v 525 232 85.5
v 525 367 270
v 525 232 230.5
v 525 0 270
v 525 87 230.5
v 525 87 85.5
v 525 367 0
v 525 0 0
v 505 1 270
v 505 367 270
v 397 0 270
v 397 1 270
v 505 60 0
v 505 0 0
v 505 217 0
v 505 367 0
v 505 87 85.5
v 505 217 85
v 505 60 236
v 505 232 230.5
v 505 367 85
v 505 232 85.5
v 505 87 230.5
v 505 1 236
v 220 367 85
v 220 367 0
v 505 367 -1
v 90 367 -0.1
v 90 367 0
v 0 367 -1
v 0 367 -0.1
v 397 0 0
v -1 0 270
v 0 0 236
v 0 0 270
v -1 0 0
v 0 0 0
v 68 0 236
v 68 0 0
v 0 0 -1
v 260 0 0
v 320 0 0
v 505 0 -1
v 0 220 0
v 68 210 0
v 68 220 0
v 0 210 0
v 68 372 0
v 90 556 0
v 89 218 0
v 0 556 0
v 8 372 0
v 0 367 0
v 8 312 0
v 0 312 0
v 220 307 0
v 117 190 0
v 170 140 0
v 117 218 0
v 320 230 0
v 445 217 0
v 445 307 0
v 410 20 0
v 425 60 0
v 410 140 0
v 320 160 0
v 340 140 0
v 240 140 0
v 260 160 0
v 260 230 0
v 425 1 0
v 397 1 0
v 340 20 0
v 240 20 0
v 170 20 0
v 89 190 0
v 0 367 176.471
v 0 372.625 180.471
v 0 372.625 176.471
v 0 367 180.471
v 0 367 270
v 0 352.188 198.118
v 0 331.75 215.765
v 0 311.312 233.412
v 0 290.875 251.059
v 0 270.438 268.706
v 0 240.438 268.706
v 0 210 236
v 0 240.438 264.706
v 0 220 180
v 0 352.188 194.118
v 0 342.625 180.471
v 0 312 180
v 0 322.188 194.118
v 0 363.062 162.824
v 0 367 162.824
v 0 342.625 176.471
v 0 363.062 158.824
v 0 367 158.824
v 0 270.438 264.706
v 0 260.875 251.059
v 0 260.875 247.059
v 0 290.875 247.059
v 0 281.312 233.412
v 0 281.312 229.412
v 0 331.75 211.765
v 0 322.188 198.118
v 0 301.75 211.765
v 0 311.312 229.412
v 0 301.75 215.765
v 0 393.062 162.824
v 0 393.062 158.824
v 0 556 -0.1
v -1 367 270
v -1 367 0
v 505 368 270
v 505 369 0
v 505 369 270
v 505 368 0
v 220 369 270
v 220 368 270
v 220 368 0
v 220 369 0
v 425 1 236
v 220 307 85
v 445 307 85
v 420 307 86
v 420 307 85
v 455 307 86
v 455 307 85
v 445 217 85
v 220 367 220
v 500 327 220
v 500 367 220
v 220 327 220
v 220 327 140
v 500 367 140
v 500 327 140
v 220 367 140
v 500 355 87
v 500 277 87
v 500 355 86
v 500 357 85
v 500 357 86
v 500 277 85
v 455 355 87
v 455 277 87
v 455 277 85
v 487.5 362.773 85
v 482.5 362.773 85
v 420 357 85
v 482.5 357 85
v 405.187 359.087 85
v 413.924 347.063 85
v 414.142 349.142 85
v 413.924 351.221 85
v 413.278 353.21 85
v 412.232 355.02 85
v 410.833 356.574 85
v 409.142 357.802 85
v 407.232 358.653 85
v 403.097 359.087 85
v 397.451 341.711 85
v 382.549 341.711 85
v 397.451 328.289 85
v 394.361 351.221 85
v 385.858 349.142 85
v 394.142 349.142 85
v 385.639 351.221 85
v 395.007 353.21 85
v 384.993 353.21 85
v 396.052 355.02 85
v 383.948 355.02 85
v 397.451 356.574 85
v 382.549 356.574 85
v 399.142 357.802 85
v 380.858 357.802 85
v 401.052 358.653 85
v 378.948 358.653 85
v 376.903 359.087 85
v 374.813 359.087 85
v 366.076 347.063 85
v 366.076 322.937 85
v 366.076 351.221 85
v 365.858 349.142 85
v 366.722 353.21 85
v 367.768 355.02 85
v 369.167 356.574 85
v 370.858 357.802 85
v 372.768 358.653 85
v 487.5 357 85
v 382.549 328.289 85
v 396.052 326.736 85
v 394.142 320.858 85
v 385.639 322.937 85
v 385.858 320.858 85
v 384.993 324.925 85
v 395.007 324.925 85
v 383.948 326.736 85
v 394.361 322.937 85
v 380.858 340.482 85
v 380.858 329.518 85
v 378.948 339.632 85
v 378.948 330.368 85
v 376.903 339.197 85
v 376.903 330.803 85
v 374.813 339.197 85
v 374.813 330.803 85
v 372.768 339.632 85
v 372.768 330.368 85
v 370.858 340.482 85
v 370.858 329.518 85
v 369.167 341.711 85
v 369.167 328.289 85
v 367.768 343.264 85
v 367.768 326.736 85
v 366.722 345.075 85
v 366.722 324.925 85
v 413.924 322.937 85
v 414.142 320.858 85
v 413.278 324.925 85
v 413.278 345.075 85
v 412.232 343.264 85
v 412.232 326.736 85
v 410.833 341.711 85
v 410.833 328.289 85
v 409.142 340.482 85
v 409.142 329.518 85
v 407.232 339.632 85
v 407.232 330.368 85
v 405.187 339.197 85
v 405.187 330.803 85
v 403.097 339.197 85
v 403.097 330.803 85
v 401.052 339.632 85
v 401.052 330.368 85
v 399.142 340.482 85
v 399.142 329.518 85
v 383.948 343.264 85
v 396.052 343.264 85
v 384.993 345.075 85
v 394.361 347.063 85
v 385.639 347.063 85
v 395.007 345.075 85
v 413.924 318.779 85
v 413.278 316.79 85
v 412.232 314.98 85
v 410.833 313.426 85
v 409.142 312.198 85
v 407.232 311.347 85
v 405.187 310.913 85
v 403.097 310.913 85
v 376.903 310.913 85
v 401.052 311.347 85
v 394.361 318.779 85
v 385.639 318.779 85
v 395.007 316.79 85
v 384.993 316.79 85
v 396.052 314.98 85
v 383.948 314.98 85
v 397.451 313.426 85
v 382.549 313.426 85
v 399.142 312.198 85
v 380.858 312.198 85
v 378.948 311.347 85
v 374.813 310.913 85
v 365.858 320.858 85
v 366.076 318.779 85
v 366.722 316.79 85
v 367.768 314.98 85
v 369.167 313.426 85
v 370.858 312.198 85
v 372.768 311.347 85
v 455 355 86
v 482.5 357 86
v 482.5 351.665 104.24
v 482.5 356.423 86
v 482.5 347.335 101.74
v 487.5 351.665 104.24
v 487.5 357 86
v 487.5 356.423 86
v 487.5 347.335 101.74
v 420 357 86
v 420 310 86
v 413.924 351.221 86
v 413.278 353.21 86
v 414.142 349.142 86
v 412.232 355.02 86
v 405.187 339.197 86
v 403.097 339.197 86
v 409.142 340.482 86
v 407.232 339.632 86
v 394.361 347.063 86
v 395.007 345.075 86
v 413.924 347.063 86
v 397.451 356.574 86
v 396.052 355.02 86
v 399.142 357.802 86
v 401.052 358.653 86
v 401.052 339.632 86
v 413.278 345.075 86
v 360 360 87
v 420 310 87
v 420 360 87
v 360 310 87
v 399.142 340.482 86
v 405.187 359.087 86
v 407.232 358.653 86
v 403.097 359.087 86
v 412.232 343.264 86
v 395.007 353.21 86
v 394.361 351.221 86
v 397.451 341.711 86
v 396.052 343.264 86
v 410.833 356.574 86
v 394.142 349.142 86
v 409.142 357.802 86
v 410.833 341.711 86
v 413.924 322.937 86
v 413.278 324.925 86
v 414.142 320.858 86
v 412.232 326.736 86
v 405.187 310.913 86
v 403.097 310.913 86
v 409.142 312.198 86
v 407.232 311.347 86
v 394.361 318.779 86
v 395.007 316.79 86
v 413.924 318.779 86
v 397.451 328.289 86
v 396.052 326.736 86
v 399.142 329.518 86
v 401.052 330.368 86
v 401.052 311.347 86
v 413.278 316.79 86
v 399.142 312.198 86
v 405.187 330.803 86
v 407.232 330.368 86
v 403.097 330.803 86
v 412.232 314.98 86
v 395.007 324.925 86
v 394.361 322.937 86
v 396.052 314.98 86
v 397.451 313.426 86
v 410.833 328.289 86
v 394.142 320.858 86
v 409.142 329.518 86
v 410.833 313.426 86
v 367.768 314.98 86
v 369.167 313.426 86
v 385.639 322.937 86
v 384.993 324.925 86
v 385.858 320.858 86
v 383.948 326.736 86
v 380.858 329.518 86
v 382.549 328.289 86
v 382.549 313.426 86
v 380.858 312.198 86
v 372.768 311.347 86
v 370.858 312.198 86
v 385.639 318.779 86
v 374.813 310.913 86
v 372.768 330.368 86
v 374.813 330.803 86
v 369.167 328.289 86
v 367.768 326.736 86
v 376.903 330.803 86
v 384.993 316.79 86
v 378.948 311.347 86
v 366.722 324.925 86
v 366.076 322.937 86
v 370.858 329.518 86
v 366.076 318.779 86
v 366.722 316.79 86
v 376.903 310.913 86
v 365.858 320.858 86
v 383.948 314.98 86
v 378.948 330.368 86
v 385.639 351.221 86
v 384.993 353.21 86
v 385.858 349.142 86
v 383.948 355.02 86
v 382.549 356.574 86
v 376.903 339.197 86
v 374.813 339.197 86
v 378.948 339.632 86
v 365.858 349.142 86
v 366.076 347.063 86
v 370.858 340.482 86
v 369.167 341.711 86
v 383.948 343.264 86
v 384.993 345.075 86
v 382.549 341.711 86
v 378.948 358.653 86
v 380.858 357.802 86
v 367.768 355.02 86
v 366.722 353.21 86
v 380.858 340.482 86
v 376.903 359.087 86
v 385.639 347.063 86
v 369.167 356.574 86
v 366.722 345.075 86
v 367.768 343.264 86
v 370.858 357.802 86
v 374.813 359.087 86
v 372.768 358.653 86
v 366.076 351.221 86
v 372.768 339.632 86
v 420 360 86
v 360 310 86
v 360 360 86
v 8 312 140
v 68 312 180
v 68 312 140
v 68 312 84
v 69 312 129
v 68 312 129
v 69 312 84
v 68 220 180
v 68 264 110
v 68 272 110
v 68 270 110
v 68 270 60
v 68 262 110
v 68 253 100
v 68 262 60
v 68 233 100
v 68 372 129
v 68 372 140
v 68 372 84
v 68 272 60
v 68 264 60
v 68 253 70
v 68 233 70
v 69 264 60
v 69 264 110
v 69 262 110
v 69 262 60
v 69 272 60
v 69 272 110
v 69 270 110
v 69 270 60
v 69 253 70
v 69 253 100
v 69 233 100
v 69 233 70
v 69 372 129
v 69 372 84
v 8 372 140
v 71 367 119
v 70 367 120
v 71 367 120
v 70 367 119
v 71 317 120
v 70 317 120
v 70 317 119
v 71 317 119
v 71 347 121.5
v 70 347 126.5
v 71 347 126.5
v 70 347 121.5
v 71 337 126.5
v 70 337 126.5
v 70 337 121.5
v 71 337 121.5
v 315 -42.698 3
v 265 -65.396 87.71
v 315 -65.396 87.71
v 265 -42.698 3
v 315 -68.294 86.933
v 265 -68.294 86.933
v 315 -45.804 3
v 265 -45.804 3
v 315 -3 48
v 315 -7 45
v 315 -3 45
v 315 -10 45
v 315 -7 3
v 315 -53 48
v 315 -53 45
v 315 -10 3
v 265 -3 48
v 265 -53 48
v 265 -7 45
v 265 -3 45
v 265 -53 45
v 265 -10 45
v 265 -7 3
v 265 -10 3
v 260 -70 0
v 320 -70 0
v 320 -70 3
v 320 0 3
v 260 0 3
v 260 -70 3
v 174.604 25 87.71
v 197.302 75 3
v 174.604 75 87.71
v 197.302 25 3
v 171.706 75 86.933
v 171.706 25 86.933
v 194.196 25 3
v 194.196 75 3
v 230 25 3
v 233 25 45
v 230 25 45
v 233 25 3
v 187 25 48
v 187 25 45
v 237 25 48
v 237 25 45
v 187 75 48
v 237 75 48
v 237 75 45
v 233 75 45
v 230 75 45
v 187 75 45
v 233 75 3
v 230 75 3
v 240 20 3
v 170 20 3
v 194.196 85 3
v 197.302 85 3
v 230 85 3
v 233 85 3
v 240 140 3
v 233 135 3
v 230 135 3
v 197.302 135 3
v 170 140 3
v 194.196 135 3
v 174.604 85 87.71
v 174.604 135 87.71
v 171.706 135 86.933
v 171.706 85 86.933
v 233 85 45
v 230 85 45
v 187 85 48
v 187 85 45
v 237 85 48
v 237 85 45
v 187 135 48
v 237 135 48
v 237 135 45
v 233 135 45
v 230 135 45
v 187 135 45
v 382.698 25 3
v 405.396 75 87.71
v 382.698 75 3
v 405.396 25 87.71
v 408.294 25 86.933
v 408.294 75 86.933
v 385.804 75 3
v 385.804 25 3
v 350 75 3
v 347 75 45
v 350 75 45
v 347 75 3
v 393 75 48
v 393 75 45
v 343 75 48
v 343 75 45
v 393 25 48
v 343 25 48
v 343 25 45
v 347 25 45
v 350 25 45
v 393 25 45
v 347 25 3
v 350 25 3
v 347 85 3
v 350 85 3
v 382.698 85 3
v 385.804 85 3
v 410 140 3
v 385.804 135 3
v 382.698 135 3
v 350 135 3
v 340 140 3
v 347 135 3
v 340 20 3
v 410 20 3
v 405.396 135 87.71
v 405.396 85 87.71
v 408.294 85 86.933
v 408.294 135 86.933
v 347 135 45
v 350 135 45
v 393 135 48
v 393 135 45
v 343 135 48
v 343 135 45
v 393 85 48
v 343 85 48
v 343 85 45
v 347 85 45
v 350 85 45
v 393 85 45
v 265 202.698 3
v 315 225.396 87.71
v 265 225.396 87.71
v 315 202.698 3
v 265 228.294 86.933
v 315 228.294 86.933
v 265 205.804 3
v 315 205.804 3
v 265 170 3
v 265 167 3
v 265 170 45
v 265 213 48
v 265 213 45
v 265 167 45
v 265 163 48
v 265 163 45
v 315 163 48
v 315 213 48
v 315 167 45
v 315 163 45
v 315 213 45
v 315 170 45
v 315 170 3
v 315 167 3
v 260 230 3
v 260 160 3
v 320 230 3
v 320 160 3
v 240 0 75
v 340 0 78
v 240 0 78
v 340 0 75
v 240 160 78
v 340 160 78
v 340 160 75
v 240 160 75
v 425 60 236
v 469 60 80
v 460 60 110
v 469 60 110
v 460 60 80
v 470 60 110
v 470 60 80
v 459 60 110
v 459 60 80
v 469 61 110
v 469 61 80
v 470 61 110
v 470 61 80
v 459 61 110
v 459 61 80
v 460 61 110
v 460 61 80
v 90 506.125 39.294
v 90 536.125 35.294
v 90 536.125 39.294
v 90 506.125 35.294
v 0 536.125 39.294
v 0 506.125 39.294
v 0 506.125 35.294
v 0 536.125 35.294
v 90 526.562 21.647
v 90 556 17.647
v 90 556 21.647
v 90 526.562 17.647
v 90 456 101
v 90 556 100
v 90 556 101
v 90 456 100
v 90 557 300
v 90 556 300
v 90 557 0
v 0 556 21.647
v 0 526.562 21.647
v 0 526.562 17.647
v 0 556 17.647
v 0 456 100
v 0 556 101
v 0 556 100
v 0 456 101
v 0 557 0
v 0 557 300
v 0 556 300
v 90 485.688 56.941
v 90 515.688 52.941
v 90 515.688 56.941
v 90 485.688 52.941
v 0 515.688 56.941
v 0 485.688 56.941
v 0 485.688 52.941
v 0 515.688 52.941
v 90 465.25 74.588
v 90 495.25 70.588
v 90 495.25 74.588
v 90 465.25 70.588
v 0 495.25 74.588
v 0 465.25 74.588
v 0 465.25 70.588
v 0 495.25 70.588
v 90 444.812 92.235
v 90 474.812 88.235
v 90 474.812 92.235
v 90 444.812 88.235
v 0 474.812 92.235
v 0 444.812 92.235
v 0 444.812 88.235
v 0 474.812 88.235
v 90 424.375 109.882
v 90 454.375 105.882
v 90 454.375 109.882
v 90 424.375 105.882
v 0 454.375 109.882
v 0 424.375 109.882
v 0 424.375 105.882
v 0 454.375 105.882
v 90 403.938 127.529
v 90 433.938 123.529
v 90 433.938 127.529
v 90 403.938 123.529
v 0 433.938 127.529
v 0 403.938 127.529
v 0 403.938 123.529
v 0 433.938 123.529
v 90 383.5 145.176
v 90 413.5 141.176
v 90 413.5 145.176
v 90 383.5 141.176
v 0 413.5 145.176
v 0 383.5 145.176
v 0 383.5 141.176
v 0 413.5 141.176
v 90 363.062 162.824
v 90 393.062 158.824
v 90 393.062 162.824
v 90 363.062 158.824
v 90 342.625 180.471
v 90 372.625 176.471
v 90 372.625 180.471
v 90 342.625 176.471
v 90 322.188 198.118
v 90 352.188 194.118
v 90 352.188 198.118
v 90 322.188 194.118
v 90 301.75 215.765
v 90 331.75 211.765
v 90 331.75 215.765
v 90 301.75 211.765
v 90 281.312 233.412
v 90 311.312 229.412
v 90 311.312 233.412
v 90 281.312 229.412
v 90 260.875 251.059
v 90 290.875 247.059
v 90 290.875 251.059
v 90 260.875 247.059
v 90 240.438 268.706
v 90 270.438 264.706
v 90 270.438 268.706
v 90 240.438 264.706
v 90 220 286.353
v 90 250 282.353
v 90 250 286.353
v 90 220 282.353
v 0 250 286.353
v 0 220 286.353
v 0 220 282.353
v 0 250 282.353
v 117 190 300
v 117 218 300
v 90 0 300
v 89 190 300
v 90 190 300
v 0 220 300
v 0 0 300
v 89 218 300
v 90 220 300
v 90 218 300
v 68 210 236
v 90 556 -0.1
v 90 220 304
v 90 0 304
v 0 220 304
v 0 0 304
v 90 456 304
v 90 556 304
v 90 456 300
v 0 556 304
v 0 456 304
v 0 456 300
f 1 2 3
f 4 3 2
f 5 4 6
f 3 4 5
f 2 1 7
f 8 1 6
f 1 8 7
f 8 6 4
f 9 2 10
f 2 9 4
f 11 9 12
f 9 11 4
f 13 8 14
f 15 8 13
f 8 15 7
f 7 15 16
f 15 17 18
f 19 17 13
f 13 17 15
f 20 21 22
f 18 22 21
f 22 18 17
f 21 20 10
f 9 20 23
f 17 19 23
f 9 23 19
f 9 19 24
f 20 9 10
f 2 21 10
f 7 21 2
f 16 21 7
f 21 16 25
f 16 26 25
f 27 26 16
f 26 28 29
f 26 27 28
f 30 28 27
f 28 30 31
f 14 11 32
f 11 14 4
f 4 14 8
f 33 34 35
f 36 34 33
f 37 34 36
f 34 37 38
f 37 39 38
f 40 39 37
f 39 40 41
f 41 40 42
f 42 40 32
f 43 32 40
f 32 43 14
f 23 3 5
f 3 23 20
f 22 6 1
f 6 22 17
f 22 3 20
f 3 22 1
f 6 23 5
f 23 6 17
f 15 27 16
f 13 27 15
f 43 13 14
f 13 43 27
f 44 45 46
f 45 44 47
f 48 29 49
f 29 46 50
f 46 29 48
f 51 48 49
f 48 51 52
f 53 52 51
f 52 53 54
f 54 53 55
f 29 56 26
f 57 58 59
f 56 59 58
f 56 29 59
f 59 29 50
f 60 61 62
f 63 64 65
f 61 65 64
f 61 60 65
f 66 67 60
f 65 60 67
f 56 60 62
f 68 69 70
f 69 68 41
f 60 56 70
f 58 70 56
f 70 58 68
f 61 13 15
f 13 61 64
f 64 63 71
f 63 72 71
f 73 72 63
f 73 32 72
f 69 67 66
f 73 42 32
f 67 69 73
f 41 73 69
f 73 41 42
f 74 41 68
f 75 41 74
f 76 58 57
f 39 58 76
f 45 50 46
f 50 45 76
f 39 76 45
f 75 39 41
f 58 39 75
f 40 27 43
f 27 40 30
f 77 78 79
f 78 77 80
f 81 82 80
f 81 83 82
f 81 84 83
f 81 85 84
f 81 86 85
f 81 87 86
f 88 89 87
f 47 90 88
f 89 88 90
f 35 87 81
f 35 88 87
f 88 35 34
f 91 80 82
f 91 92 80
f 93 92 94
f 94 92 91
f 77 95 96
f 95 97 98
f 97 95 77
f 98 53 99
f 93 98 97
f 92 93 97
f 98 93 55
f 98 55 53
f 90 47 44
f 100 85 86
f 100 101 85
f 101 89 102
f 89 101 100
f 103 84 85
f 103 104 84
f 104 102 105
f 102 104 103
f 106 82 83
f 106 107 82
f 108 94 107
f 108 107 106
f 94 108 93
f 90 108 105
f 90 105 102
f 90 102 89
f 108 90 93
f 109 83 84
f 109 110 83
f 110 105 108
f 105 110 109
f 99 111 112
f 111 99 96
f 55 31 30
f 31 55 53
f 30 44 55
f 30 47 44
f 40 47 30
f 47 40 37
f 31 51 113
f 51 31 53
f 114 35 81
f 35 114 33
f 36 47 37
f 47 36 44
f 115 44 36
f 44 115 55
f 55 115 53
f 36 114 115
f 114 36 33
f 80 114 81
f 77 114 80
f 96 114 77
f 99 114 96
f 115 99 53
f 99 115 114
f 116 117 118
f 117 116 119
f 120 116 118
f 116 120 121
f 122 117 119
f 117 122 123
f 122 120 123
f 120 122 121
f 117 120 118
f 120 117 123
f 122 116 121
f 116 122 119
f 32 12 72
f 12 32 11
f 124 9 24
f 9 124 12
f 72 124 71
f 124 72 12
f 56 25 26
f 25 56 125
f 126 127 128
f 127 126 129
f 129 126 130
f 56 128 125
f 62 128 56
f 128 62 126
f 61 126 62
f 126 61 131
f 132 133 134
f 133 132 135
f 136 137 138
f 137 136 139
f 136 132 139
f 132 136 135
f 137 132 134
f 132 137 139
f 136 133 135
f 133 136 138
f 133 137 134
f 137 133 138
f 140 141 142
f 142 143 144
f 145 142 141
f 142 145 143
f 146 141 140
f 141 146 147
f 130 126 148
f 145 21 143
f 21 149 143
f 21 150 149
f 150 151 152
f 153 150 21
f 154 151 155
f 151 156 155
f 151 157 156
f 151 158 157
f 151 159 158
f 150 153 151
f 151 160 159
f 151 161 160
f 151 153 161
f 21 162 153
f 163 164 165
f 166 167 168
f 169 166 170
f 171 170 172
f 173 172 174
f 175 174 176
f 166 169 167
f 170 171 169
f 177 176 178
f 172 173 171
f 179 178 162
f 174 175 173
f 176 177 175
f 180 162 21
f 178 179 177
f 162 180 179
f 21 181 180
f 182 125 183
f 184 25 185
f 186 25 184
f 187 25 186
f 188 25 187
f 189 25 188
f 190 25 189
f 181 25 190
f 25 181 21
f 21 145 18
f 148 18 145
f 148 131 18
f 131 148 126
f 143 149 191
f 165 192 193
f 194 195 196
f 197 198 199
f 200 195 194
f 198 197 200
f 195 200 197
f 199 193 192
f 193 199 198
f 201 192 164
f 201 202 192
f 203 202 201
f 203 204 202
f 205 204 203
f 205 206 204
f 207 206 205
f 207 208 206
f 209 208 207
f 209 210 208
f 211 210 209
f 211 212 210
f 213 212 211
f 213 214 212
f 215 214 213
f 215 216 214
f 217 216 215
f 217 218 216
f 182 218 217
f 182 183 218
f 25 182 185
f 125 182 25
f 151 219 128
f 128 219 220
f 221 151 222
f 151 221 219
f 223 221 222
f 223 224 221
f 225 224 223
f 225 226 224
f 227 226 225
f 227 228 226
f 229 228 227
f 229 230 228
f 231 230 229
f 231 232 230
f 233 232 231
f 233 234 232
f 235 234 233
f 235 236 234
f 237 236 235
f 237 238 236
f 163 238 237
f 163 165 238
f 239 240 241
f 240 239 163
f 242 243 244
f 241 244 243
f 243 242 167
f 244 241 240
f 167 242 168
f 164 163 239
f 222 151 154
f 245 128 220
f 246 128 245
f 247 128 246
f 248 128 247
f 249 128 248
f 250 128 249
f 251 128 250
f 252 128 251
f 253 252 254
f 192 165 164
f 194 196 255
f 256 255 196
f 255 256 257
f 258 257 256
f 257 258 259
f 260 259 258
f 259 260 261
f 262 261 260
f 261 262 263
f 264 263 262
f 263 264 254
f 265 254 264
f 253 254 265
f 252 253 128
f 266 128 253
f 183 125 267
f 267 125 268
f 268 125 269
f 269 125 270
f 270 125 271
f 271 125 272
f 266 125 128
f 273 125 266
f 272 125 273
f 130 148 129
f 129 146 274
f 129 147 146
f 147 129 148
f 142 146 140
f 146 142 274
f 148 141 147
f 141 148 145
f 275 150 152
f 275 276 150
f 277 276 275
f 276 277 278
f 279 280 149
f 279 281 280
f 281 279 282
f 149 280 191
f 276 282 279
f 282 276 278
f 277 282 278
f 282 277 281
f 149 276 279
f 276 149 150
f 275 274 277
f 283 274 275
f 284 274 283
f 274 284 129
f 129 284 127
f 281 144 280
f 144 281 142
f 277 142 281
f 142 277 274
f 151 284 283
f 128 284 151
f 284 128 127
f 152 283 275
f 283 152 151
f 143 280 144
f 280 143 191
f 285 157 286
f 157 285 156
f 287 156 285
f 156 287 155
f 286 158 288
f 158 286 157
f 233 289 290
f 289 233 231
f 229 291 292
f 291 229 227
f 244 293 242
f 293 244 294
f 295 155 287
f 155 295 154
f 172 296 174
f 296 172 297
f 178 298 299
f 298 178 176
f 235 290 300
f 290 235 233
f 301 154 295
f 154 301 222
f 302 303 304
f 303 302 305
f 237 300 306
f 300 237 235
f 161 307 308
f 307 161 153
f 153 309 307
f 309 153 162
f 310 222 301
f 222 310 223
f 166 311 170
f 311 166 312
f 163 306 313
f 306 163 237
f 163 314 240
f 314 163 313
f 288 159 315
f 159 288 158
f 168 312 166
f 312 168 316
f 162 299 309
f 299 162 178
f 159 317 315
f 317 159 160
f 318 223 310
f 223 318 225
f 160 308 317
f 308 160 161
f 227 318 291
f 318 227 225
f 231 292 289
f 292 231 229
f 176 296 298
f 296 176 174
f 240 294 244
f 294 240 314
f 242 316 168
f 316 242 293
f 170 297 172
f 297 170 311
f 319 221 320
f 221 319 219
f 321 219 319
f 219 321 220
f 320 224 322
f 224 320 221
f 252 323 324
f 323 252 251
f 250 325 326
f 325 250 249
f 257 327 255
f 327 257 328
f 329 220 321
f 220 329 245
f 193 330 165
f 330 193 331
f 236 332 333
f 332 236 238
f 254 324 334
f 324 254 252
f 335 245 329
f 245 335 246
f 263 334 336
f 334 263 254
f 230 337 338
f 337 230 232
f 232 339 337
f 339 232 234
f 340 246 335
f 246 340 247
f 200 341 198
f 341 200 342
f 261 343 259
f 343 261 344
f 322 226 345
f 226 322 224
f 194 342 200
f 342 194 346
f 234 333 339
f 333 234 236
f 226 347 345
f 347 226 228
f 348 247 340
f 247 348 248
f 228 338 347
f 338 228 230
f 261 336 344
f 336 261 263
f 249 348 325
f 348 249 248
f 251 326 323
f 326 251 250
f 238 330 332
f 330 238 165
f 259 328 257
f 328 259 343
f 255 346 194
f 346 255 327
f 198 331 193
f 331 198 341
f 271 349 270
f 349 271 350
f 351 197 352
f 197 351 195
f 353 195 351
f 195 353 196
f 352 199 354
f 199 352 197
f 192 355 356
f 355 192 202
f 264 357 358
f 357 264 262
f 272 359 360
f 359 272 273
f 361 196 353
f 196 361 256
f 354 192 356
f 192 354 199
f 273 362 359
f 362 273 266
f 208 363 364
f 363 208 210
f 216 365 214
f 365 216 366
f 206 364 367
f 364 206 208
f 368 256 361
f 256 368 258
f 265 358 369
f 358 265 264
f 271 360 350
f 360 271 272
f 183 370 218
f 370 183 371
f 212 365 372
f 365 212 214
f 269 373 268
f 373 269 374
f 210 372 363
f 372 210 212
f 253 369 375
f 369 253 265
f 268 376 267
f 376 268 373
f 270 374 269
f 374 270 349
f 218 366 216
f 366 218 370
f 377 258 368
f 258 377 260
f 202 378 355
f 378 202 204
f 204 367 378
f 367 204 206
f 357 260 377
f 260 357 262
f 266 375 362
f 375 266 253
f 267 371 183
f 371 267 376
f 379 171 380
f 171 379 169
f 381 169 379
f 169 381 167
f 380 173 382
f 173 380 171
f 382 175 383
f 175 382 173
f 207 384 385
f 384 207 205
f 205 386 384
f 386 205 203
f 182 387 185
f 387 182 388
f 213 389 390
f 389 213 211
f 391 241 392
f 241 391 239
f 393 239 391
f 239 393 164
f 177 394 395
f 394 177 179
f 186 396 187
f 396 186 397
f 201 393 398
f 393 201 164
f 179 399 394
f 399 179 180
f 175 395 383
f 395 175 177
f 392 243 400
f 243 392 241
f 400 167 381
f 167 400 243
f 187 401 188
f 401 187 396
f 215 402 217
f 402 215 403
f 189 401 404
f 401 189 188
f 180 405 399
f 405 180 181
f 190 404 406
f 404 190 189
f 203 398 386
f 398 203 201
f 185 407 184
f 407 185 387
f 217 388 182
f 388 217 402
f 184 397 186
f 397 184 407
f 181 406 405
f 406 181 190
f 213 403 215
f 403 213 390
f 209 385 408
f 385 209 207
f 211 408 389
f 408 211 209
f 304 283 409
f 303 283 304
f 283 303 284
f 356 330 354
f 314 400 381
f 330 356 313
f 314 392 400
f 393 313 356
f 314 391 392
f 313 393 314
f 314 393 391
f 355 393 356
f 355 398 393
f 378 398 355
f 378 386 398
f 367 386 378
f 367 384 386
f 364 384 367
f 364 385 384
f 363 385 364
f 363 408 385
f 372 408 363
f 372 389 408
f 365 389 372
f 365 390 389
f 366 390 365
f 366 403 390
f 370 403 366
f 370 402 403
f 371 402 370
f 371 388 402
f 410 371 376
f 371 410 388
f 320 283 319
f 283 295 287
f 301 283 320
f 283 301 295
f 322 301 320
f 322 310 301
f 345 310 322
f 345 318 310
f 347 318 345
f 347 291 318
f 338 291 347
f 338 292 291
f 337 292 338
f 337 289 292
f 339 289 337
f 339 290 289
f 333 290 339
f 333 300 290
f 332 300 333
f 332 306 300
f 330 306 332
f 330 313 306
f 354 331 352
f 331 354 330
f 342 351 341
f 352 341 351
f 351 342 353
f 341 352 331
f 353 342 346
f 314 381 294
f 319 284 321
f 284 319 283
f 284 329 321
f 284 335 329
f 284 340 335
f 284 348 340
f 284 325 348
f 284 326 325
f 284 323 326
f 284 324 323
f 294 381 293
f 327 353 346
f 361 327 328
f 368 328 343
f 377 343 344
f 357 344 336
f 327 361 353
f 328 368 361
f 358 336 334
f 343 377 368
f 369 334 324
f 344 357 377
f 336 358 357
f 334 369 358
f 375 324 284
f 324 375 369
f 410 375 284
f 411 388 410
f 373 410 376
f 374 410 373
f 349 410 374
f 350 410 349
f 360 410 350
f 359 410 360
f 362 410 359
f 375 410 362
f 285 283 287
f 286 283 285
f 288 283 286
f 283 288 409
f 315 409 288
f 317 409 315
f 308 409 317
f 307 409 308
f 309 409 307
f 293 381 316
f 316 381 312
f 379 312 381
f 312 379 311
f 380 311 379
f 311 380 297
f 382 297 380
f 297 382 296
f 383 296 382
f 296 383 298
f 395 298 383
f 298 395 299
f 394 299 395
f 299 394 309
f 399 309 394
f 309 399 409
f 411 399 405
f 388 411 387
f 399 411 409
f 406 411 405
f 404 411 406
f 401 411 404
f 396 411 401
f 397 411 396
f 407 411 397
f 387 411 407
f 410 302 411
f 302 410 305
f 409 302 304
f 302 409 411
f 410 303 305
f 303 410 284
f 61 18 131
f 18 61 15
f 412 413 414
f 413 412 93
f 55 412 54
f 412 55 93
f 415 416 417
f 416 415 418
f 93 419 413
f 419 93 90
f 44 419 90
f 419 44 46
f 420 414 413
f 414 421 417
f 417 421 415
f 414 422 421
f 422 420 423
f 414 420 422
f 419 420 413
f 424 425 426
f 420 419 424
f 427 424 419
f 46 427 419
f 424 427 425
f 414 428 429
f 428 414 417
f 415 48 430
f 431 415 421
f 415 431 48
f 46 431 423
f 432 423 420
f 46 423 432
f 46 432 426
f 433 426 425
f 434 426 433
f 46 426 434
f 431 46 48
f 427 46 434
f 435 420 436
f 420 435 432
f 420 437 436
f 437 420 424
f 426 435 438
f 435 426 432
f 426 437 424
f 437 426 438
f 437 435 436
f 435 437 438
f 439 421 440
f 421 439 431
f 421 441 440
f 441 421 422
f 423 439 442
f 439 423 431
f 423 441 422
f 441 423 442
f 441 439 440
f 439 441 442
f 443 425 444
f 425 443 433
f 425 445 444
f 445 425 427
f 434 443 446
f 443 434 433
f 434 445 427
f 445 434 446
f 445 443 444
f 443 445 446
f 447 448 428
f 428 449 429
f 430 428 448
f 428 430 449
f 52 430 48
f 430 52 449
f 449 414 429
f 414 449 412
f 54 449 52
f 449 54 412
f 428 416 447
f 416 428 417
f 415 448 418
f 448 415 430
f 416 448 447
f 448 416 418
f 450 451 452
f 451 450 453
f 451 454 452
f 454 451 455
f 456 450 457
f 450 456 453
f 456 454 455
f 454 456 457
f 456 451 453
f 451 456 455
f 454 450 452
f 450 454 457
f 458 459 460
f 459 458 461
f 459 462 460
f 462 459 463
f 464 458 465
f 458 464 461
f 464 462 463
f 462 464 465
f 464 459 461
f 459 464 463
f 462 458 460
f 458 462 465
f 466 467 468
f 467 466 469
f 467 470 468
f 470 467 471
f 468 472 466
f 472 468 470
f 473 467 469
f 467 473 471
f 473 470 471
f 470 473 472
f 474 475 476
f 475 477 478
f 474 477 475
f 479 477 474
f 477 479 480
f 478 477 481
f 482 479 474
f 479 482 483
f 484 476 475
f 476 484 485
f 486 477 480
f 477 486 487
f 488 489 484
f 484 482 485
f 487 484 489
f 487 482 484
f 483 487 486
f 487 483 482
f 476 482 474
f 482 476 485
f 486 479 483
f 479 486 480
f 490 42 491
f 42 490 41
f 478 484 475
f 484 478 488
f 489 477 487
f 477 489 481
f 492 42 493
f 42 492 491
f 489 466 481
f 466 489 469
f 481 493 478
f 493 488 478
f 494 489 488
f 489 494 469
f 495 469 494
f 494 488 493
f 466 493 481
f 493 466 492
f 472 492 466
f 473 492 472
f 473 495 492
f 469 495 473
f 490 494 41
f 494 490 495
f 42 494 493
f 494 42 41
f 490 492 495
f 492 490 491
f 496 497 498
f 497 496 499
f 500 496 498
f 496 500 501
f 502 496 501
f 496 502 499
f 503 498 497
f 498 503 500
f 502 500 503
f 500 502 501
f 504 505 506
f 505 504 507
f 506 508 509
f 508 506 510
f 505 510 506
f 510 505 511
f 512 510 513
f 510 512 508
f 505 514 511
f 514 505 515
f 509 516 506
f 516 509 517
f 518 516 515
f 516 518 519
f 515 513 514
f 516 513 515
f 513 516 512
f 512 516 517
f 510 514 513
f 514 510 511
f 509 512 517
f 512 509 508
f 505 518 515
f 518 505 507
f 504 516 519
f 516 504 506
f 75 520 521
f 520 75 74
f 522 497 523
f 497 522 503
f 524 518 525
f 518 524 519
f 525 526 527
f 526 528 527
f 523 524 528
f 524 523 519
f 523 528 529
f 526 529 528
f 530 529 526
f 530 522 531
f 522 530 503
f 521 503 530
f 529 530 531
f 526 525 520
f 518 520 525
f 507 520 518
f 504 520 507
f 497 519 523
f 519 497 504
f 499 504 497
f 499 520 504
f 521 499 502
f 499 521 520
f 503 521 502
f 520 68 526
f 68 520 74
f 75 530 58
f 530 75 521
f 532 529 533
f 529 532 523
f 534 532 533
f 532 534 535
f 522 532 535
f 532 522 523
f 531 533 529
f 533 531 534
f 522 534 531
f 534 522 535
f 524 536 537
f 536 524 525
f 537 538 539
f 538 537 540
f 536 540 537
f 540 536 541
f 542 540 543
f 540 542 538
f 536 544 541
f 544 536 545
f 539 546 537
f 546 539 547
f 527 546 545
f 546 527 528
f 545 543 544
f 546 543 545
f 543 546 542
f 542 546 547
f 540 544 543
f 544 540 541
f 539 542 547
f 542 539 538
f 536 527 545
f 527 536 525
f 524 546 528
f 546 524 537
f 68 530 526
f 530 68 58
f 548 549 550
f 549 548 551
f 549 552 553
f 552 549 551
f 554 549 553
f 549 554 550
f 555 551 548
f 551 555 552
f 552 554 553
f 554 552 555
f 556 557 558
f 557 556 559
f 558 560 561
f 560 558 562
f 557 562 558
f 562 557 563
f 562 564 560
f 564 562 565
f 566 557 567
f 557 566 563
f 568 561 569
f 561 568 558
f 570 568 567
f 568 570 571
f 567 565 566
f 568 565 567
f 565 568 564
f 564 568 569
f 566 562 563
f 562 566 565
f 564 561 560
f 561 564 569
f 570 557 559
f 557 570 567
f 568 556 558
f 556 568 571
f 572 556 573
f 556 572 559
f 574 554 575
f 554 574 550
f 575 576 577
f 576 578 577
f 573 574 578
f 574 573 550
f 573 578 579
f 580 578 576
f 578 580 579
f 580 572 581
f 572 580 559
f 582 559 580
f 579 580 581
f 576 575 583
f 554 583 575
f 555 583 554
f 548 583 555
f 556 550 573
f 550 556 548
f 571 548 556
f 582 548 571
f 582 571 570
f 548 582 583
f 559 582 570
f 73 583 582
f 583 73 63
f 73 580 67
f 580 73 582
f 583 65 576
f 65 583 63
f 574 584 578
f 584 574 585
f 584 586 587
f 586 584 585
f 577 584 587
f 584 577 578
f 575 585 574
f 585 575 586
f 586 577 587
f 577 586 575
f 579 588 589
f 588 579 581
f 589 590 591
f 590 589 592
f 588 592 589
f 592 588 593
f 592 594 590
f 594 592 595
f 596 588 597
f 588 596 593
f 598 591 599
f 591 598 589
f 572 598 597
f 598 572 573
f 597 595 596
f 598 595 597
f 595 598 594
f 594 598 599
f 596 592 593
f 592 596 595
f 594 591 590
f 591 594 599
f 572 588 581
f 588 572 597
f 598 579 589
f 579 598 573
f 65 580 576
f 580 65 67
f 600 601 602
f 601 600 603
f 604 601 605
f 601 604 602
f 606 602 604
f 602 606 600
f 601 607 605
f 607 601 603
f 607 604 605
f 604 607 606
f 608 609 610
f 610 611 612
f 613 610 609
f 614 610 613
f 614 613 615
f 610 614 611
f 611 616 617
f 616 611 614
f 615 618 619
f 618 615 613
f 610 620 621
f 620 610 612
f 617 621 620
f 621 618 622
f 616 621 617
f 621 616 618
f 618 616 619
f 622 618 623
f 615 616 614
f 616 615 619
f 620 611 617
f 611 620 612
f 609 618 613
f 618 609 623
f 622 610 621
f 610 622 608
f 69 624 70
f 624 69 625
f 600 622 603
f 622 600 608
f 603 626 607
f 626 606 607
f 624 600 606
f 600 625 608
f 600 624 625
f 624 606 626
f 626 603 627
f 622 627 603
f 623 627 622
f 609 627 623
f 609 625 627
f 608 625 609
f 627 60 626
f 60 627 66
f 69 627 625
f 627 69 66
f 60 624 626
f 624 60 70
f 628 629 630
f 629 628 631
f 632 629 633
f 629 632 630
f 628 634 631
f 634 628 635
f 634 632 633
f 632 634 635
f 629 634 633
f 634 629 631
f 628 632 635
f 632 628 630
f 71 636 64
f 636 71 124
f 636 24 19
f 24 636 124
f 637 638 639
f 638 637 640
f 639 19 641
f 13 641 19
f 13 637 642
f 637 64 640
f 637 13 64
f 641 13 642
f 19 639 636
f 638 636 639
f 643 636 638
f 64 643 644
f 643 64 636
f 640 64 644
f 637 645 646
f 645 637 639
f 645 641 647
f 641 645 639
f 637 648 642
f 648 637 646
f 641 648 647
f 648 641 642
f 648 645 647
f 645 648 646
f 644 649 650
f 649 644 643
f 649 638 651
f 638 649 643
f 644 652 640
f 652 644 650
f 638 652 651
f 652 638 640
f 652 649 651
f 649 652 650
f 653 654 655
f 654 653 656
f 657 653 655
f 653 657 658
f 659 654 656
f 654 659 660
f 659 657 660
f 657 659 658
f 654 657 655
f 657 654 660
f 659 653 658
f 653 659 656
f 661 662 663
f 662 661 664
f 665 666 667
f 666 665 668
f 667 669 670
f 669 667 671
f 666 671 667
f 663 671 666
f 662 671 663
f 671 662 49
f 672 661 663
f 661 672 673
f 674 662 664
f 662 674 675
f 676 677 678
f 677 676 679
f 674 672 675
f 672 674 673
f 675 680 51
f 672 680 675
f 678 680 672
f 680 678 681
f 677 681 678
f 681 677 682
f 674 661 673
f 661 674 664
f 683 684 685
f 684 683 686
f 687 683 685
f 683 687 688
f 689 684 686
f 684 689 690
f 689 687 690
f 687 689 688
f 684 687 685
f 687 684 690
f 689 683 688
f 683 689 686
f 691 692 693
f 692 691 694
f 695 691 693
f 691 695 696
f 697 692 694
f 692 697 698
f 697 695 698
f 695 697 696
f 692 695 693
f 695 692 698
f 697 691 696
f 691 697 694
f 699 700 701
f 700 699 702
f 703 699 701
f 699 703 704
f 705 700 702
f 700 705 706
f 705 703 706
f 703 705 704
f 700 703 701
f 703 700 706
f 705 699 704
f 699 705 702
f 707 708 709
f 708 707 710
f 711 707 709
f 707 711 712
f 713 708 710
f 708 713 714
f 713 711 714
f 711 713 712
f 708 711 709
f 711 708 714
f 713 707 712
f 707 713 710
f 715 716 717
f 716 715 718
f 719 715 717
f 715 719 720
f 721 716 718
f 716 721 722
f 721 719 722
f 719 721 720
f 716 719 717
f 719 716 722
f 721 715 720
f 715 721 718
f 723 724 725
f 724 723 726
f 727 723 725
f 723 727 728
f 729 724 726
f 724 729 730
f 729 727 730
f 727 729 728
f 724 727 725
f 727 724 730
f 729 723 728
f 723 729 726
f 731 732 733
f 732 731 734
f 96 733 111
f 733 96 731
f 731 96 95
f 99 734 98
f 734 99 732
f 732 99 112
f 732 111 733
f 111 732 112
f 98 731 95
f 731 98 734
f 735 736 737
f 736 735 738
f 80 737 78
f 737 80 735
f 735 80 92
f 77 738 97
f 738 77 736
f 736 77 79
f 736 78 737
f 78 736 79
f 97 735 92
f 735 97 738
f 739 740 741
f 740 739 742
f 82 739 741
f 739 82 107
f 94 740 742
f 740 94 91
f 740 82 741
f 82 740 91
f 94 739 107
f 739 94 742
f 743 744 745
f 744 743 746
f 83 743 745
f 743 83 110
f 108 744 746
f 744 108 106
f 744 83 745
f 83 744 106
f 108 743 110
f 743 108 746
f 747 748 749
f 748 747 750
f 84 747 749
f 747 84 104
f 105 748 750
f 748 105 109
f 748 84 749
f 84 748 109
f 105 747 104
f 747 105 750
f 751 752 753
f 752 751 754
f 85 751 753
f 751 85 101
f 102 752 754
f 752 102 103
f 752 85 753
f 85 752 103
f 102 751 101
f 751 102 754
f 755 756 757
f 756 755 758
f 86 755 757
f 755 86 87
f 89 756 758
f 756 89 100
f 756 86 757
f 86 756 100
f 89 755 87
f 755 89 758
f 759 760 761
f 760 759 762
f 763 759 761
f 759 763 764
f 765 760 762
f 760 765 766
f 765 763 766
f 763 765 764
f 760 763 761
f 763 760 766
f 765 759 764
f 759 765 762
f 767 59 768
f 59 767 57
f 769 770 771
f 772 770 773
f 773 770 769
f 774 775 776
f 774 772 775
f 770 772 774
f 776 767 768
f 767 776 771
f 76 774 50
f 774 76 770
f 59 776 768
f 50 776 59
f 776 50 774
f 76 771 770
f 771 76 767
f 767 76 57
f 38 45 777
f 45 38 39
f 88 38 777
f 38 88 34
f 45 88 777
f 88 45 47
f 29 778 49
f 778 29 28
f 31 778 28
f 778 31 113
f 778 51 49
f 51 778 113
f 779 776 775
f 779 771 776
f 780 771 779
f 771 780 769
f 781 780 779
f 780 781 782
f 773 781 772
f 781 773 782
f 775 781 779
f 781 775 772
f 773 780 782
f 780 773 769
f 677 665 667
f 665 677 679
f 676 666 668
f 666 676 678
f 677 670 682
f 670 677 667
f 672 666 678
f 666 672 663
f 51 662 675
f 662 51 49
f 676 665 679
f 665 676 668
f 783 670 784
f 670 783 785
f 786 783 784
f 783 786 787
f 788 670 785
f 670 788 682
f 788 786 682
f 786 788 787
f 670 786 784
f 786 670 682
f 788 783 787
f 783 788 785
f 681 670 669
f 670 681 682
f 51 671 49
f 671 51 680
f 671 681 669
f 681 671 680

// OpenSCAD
// floor

h=270;
w=505;
d=367;

//sciany
color("white")
 {
  //podloga
  translate([0,0,-1])
    cube([w,d,1]);
  //lewa   
  translate([-1,0,0])
    cube([1,d,h]);
  // tylna
  translate([220,d+1,0])
    cube([285,1,h]);
  // prawa
  translate([w,0,0])
    difference() {
     cube([20,d,h]);
     translate([-1,87,85.5]) cube([30,145,145]); // okno
    };
  // parapet
  //translate([w-4,d-131,85])
  //  rotate(a=[0,0,-90])
  //    cube([151,4,1]);
  // tylna
  translate([w-108,0,0])
    cube([108,1,h]);
 }
 
 // kolumna
 color("white")
   translate([89,190,0])
     cube([28,28,300]);
 
 // L: ciag szafek na tylnej scianie
 k=100;
 s=120;  
 LX=k+s; // poczatek szafek z tylu
 LY=d-60;  // poczatek szafek z tylu
 SZ_X=w-LX;
 
 wys_blatu = 82;
 
 // blat tyl
 color("white")
   translate([LX,LY,wys_blatu])
     cube([SZ_X,60,3]);
 
 color("green") {
   szafka(LX,80);
   szafka(LX+80,60);
   szafka(LX+140,60);
   szafka(LX+200,25);
 }


// szafa po lewej 
color("green") {
    cube([68,190+20,236]);
}

// zlew
module zlew() {
color("DimGray") {
    translate([LX+140,LY+2,wys_blatu+4]) {
      cube([80,50,1]);
      translate([30,50,0]) rotate(a=[30,0,0]) cube([5,5,30],center=true);
    }
}
color("#404040") {
    translate([LX+143,LY+4,wys_blatu+4]) {
      cube([80-4-20,50-4,1.5]);
    }
  }
}
//zlew();

// zlew narozny
module zlew_narozny() {
      color("DimGray") { 
          cube([80,50,1]);
      }
      color("#404040") {
          translate([80-45,-(80-50),0]) rotate([0,0,00]) cube([45,78,2]);
          translate([65,50,5]) rotate(a=[30,0,0]) cube([5,5,30],center=true);
      }

}

 
module szafka(leftoffset,width) {
    translate([leftoffset,d-60,0])
      cube([width,60,82]);
}

// szafki gorne z tylu
color("green") {
    umiesc_z_przodu([0,20,140]) szafka_wiszaca(80);
    umiesc_z_przodu([80,20,140]) szafka_wiszaca(60);
    umiesc_z_przodu([80+60,20,140]) szafka_wiszaca(80);
    umiesc_z_przodu([80+60+80,20,140]) szafka_wiszaca(60);
}
    umiesc_z_przodu([80+60+60,00,85])  zlew_narozny(); 


module szafka_wiszaca(w) {
    cube([w,40,80]);
}

// umiesc
module umiesc_z_przodu(a) {
    translate([LX+a.x,LY+a.y,a.z]) 
      rotate(a=[0,0,0])
        children();
}

R_szerokosc=70;
RX=w-60;
RY=d-60;

// blat
module blat(w) {
color("white")
      cube([w,60,3]);
}

katy=[45,135,-135,-45];

// plyta indukcyjna
module plyta_indukcyjna() {
    cube([60,50,1]);
    for (i=[0:3]) {
    translate([30+sin(katy[i])*20,25+cos(katy[i])*20,0]) 
        cylinder(2,r1=10,r2=10,center=true);
    }
}

// plyta
color("#400040") umiesc_z_przodu([80+60,3,wys_blatu+4]) plyta_indukcyjna();


module blatowyspa() {
  dlugosc=280;
  szerokosc=100;
  translate([0,0,75]) translate([0,-dlugosc+60,0]) cube([szerokosc,dlugosc,1]);
}

// blatowyspa
make_blatowyspa = false;

if (make_blatowyspa) {
    color("#A0A0A0") umiesc_z_boku([60+60+10+60,0,0]) blatowyspa();
    translate([w-60,10,0]) krzeslo();
    translate([w-120,10,0]) krzeslo();
    translate([w-180,10,0]) krzeslo();
    translate([w-240,10,0]) krzeslo();
    translate([w-180,10+100+70+70,0]) rotate([0,0,180]) krzeslo();
    translate([w-120,10+100+70+70,0]) rotate([0,0,180]) krzeslo();
}

//---- bok
// blaty
umiesc_z_boku([60,0,wys_blatu]) blat(90);
// szafki
//umiesc_z_boku([0,0,wys_blatu+2]) zlew_narozny();
color("green") {
    umiesc_z_boku([0,0,0]) cube([90,60,82]);
    umiesc_z_boku([90,0,0]) cube([60,60,82]);
    //umiesc_z_boku([40,20,140]) szafka_wiszaca(80);
}


// umiesc
module umiesc_z_boku(a) {
    translate([RX+a.y,d-a.x,a.z]) 
      rotate(a=[0,0,-90])
        children();
}

// lewa strona
//color("white",alpha=0.1) translate([LX,LY-60,wys_blatu]) cube([60,100,3]);
//color("green", alpha=0.1) translate([LX,LY-60,0]) cube([60,100,wys_blatu]);

// slupek z piekarnikiem

// lodowka
translate([68,220,0]) rotate([0,0,90]) lodowka();

// piekarnik
translate([68,220+92,0]) rotate([0,0,90]) piekarnik();


// lodowka
module lodowka() {
  szer=92;
  gl=68;
  color("silver") cube([szer,gl,180]);
  color("#808080") translate([szer/2-4,-1,60]) cube([2,1,50]);
  color("#808080") translate([szer/2+4,-1,60]) cube([2,1,50]);
  color("#808080") translate([szer/4-10,-1,70]) cube([20,1,30]);
}

// piekarnik
module piekarnik() {
    color("green") cube([60,60,140]);
    h0=84;
    translate([0,-1,h0]) color("black") cube([60,1,45]);
    translate([5,-3,h0+35]) color("white") cube([50,1,1]);
    translate([60/2-5,-3,h0+37.5]) color("blue") cube([10,1,5]);
}


/*
// blat stolu
translate([w-70-260,70,75]) color("brown", alpha=0.5) cube([260,100,3]);

translate([w,60+30,0]) rotate(a=[0,0,90]) krzeslo(); // szczyt
translate([w-70-60,0,0]) rotate(a=[0,0,0]) krzeslo();
translate([w-70-60-60,0,0]) rotate(a=[0,0,0]) krzeslo();
translate([w-70-60-60-60,0,0]) rotate(a=[0,0,0]) krzeslo();
translate([w-70-60-60-60-60,0,0]) rotate(a=[0,0,0]) krzeslo();
translate([w-70,70+100+70,0]) rotate(a=[0,0,180]) krzeslo();
translate([w-70-60,70+100+70,0]) rotate(a=[0,0,180]) krzeslo();
translate([w-70-60-60,70+100+70,0]) rotate(a=[0,0,180]) krzeslo();
translate([w-70-60-60-60,70+100+70,0]) rotate(a=[0,0,180]) krzeslo();
translate([w-70-60-60-60-60-90,100+70-20,0]) rotate(a=[0,0,-90]) krzeslo();
*/

// krzeslo
module krzeslo() {
    translate([5,25,0]) {
    color("brown") rotate(a=[15,0,0]) cube([50,3,90]);
    color("brown") translate([0,-8,45]) cube([50,50,3]);
    color("brown") translate([0,35,0]) cube([50,3,45]);
    }
    color("#101010") cube([60,70,3]);
}


module maly_stol() { 
  // blat malego stolu
  translate([-160-70,70,75]) color("brown", alpha=0.5) cube([160,100,3]);
  // krzesla malego stollu
  translate([0,60+30,0]) rotate(a=[0,0,90]) krzeslo(); // szczyt
  translate([-70-60-20,0,0]) rotate(a=[0,0,0]) krzeslo();
  translate([-70-60-60-20,0,0]) rotate(a=[0,0,0]) krzeslo();
  translate([-70-20,70+100+70,0]) rotate(a=[0,0,180]) krzeslo();
  translate([-70-60-20,70+100+70,0]) rotate(a=[0,0,180]) krzeslo();
  translate([-10-70-60-60-100,100+70-20,0]) rotate(a=[0,0,-90]) krzeslo(); // dol
}

make_malystol = true;
if (make_malystol) {
translate([120+50,-70,0]) rotate(a=[0,0,-90])  maly_stol();
//translate([450,0,0]) rotate(a=[0,0,0])  maly_stol();
}

// szafa tyl
module szafa_tyl() {
    sz=80;
    color("green") cube([sz,60,236]);
    color("grey") translate([sz/2-5,-1,80]) cube([1,1,30]);
    color("grey") translate([sz/2+5,-1,80]) cube([1,1,30]);
}

translate([w,60,0]) rotate([0,0,180]) szafa_tyl();


module przyklej(w) { translate([w.x,w.y,w.z]) children(); }


// kalkulacje schody
htotal = 300;
num = 17;
h1 = 300/(num);
space = 336;
step_depth = 30;
//step_dist_tmp = space/(num-1);
//step_dist = step_dist_tmp - (step_depth - step_dist_tmp)/(num-1);

// shorter step_dist to accomodate for steps longer than 
// the inter-step distance
step_dist = (-step_depth*num + num*space + step_depth)/(num-1)/(num-1);

module schodek() { 
    color("#705030") cube([90,step_depth,4]);
}


module schody(n) {
    h=h1;
    przyklej([0,0,-h]) schodek();
    if(n>1) {
      przyklej([0,step_dist,-h]) schody(n-1);
    }
}

translate([0,220,300]) schody(num-1);
// przestrzen pod schodami
translate([0,220,-0.1]) color("#808080", alpha=0.4) cube([90,space,0.1]);
translate([0,0,300]) cube([90,220,4]);
// wirtualna gora
translate([0,220+space-100,100]) color("#202020",alpha=0.001) cube([90,100,1]);
translate([0,220+space-100,300]) color("grey",alpha=1) cube([90,100,4]);
translate([0,220+space,0]) color("#202020",alpha=0.001) cube([90,1,300]);
